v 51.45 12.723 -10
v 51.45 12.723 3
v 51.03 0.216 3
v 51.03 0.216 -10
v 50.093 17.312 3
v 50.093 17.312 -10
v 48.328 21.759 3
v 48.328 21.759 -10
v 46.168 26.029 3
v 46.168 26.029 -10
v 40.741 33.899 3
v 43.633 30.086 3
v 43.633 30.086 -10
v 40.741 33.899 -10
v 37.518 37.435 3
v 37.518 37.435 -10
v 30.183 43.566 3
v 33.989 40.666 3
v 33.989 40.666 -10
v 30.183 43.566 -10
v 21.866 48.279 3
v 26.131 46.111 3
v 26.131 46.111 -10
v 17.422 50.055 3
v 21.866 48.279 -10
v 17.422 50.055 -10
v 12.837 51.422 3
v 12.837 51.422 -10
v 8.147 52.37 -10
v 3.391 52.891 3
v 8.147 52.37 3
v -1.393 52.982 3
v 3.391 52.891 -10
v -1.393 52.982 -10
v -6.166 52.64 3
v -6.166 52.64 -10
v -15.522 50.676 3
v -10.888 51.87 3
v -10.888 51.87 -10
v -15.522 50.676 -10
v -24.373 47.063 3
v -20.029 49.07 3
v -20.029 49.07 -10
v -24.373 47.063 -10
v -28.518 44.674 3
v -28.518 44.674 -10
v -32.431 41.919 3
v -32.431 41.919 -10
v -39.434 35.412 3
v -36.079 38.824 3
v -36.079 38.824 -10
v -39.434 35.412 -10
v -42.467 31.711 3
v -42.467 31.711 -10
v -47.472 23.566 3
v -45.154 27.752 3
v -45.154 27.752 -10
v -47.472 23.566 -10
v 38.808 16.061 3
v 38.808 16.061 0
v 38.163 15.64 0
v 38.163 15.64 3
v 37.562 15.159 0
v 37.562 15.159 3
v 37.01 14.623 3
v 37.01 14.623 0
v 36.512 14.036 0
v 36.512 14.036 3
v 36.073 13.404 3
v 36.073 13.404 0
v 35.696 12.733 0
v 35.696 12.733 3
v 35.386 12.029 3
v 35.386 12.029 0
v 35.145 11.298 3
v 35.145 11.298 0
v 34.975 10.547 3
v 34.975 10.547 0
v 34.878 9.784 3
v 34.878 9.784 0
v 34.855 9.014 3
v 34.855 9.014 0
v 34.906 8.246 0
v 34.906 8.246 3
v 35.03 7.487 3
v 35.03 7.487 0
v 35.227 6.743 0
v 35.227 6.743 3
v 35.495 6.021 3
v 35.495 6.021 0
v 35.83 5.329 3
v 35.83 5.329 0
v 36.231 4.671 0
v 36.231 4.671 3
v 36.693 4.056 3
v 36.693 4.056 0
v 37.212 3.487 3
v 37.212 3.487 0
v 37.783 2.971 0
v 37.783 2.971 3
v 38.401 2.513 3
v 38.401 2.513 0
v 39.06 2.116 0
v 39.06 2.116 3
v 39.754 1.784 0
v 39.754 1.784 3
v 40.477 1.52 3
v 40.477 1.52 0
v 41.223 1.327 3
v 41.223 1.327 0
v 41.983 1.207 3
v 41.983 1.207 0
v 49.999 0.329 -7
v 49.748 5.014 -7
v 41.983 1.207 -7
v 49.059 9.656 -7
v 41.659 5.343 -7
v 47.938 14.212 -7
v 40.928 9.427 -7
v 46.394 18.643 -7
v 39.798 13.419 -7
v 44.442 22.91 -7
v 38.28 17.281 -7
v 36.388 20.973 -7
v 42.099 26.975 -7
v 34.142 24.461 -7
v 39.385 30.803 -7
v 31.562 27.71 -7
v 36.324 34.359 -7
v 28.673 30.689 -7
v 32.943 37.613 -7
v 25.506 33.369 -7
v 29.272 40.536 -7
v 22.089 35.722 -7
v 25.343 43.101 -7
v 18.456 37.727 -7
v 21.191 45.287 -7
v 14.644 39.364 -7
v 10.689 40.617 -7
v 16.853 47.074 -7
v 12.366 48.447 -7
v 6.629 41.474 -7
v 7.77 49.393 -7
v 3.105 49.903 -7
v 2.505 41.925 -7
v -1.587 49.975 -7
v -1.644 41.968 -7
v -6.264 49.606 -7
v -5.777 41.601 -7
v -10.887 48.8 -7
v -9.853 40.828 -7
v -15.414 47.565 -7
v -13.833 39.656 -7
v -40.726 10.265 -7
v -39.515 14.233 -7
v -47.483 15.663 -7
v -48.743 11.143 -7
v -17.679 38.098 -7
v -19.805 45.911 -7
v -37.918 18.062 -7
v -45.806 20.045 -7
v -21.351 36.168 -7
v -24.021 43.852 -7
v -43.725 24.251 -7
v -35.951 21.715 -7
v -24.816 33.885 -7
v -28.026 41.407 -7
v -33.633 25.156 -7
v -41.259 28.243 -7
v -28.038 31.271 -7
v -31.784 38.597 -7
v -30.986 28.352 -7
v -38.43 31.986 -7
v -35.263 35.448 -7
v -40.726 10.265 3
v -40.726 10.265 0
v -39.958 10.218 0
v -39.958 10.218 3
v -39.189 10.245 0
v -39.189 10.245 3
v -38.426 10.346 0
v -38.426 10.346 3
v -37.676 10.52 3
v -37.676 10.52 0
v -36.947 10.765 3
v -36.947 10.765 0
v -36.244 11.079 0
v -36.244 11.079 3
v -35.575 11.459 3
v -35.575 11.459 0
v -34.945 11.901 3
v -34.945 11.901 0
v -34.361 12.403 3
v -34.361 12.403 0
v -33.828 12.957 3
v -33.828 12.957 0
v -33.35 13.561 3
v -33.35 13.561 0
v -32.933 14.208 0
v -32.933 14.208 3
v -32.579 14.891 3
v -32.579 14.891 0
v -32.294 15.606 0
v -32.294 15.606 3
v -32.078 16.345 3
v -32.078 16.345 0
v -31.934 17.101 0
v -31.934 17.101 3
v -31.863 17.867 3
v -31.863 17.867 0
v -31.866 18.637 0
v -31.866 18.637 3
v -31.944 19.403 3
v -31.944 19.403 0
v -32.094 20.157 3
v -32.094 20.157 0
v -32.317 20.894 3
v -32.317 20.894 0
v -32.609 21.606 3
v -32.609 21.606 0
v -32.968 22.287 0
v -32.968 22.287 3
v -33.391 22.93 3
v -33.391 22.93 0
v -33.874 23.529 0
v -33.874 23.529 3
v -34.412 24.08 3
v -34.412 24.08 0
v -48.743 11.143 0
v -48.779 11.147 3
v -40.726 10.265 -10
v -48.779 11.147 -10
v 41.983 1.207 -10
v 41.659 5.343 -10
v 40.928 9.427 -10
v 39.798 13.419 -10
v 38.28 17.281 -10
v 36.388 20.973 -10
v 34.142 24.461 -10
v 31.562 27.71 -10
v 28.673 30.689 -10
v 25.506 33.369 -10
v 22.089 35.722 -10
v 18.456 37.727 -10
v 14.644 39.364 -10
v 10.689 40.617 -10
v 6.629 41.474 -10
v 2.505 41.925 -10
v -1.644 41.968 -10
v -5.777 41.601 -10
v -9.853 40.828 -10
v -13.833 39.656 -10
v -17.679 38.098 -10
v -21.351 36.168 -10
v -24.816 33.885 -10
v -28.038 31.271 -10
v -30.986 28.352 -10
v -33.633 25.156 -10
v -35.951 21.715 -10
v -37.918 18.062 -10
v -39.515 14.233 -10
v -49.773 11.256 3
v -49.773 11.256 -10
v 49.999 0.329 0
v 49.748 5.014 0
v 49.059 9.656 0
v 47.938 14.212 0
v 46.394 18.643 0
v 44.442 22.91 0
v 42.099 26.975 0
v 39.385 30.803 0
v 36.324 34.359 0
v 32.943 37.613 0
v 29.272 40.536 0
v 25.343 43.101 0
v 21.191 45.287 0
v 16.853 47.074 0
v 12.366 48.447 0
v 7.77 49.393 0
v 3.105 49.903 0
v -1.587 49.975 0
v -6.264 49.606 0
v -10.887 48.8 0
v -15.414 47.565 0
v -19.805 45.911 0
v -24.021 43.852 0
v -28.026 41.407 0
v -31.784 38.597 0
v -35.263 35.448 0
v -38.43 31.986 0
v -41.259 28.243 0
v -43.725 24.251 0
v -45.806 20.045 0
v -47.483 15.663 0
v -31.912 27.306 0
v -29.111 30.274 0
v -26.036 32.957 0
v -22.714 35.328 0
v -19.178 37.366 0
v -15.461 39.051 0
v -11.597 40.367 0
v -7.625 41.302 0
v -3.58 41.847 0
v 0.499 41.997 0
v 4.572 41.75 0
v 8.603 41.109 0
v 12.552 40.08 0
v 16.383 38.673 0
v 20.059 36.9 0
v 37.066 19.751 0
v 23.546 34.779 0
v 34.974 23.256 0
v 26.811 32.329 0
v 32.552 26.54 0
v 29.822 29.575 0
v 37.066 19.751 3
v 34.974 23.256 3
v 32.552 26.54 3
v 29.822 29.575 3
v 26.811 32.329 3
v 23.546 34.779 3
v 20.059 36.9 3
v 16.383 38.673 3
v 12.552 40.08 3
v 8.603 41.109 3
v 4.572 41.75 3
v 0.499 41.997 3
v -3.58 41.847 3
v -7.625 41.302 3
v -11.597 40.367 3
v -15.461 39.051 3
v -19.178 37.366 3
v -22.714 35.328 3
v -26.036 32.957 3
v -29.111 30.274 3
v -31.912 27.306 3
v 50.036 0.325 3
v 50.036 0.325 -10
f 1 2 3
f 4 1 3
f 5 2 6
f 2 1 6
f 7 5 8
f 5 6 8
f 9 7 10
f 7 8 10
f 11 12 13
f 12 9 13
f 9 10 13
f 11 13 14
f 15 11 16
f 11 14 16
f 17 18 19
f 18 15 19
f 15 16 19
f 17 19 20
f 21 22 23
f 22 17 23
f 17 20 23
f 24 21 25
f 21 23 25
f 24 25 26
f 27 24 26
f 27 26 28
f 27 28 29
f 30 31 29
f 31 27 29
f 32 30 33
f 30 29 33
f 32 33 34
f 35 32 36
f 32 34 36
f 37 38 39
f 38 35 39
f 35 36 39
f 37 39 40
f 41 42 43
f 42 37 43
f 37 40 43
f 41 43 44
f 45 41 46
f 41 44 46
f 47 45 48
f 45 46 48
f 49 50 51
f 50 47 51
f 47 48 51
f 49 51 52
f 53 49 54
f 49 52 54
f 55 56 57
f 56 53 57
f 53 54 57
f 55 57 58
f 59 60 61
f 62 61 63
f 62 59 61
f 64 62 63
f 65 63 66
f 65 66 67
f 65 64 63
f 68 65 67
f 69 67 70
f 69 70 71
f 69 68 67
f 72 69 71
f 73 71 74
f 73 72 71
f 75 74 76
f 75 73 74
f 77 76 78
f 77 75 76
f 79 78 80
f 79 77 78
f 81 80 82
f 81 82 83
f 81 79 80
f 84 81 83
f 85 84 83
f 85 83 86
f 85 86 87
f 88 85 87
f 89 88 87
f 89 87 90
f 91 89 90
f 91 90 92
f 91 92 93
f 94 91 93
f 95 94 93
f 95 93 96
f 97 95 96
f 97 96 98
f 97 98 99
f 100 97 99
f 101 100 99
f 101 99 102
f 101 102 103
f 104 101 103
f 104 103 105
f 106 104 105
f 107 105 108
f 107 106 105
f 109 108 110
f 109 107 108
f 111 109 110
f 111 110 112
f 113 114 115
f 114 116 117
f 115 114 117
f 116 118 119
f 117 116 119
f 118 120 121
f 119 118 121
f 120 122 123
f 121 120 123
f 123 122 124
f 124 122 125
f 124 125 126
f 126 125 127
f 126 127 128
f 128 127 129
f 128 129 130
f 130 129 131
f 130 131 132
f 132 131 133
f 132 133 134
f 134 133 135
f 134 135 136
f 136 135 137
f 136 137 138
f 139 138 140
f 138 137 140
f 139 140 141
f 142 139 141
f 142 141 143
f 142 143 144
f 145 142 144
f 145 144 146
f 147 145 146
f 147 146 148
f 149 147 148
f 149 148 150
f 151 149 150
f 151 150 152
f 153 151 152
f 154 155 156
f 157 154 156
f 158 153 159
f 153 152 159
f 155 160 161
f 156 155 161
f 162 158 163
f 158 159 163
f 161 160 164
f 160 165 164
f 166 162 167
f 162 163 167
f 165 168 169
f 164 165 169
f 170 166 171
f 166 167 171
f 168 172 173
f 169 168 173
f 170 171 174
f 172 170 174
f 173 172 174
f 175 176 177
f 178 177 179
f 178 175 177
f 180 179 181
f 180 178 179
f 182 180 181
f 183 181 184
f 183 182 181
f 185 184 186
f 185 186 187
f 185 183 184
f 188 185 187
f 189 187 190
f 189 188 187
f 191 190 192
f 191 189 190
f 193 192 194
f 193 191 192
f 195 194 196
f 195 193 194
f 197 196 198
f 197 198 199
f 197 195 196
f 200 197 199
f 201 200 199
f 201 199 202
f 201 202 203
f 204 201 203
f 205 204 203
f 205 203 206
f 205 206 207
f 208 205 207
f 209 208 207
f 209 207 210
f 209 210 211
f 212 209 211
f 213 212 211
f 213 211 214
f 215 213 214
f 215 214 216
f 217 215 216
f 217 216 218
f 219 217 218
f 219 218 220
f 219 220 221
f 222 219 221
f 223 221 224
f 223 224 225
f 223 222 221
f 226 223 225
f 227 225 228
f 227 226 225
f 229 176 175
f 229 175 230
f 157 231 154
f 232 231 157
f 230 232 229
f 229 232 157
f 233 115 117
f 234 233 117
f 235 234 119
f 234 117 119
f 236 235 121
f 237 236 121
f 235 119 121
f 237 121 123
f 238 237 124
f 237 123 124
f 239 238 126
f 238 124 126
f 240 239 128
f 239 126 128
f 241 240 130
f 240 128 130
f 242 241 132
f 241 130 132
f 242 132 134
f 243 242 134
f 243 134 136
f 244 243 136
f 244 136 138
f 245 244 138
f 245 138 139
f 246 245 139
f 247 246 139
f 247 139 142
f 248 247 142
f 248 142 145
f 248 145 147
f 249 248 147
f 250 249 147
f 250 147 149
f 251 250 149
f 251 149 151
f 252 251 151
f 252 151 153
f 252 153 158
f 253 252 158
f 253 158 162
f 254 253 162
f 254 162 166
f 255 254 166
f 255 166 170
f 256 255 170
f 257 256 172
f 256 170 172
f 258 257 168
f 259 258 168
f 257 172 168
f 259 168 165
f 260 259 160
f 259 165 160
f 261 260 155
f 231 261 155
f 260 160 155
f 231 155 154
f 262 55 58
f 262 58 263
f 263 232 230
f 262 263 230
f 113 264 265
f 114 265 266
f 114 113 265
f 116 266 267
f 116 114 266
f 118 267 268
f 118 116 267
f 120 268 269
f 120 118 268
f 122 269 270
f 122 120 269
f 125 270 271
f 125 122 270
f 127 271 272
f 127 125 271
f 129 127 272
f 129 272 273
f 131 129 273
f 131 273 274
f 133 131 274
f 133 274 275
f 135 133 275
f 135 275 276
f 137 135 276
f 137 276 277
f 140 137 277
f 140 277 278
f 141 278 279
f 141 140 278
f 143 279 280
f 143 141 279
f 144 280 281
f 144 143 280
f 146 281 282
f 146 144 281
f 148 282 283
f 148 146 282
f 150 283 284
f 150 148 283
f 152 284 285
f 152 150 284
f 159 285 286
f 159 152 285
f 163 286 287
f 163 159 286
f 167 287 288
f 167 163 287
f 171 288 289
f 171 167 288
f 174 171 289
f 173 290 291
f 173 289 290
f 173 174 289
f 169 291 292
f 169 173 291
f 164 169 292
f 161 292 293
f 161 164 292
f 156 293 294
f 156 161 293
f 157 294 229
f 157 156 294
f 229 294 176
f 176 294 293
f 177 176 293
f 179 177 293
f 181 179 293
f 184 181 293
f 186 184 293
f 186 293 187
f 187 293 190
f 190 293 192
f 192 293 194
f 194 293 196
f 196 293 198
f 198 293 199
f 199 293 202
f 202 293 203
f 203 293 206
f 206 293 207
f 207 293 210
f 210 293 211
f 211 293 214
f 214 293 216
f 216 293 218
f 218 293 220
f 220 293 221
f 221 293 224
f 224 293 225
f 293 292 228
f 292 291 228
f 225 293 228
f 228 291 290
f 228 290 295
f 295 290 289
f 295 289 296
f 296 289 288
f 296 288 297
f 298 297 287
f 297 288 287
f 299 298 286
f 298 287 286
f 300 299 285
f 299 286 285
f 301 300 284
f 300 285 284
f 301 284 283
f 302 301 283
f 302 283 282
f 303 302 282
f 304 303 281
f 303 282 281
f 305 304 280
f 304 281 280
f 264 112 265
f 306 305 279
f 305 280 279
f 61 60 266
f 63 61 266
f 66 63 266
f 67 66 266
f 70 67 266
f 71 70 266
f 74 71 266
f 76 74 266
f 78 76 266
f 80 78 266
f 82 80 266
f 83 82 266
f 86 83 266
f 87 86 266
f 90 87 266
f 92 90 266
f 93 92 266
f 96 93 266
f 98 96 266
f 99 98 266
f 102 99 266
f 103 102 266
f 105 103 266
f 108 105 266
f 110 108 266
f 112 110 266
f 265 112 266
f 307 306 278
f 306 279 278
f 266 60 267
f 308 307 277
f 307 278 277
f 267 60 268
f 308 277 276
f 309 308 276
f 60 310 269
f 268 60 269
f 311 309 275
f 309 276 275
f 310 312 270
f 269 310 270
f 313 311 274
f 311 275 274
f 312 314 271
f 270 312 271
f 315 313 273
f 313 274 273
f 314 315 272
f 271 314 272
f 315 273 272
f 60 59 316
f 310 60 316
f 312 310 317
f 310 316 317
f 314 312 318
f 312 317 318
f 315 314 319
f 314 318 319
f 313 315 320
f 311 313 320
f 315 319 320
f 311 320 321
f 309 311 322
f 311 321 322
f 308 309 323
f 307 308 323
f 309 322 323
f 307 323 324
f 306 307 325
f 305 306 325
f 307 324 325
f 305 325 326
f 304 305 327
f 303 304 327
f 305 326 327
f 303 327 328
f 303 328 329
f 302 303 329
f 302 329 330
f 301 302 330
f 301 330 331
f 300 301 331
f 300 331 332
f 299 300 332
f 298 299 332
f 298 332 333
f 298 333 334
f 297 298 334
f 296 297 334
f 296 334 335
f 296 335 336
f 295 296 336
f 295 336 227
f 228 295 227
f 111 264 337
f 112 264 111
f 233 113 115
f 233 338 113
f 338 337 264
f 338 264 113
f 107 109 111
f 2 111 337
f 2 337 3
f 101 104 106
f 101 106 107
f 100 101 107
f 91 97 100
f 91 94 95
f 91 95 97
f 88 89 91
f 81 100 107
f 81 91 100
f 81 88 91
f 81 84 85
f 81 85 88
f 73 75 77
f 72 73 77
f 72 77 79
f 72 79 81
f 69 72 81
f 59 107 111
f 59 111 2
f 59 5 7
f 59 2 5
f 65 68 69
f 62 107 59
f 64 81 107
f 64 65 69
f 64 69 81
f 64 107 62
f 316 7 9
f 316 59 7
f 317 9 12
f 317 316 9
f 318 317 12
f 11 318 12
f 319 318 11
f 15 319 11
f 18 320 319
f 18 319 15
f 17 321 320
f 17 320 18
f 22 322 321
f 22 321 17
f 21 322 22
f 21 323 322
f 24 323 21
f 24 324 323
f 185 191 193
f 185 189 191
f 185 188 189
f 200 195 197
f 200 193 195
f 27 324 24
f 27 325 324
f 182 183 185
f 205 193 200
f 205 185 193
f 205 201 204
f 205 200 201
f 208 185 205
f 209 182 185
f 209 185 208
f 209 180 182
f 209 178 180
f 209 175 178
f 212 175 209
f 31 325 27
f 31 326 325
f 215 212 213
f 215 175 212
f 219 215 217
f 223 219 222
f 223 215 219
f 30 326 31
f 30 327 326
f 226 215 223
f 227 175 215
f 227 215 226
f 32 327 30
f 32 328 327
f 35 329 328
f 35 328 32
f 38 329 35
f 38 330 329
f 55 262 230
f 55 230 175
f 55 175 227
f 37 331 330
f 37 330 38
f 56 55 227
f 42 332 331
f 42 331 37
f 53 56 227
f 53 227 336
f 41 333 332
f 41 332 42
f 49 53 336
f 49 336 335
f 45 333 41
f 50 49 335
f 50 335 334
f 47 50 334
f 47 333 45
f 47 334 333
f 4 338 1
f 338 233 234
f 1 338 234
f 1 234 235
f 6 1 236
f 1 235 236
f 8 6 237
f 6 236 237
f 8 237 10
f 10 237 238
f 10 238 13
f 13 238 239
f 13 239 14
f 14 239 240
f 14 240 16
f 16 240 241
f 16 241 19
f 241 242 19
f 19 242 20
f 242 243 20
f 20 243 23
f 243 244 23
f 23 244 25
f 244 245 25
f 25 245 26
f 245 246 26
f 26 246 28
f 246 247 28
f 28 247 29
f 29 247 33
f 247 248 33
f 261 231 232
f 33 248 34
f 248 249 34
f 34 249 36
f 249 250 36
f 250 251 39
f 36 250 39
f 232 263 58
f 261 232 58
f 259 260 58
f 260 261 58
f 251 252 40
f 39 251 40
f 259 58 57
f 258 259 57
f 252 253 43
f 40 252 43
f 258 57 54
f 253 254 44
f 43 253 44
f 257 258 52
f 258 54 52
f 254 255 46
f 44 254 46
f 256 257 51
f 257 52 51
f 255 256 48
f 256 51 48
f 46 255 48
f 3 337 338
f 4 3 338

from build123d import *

# Parameters (mm, degrees)
SKETCH1_W                    = 50
SKETCH1_H                    = 7
REVOLVE5_ANGLE               = 167.5
SHELL2_T                     = 3
CUT_EXTRUDE3_DEPTH           = 77.072333999
CUT_EXTRUDE3_DEPTH_BACK      = 10
CUT_EXTRUDE4_DEPTH           = 77.072333999
CUT_EXTRUDE4_DEPTH_BACK      = 10
CUT_EXTRUDE_THIN1_DEPTH      = 77.072333999
CUT_EXTRUDE_THIN1_DEPTH_BACK = 20
CUT_EXTRUDE_THIN2_DEPTH      = 77.072333999
CUT_EXTRUDE_THIN2_DEPTH_BACK = 20
CUT_EXTRUDE_THIN3_DEPTH      = 76.000787866
CUT_EXTRUDE_THIN3_DEPTH_BACK = 20
SKETCH18_R                   = 8
BOSS_EXTRUDE3_DEPTH          = 3
SKETCH22_W                   = 13
SKETCH22_H                   = 12.488136332
BOSS_EXTRUDE4_DEPTH          = 1
SKETCH23_W                   = 13
SKETCH23_H                   = 12.478928716
BOSS_EXTRUDE5_DEPTH          = 1
CUT_EXTRUDE_THIN4_DEPTH      = 76.647331154
CUT_EXTRUDE_THIN4_DEPTH_BACK = 20
CUT_EXTRUDE_THIN5_DEPTH      = 76.000787866
CUT_EXTRUDE_THIN5_DEPTH_BACK = 20


with BuildPart() as part:
    # Sketch1 → Revolve5 (revolve)
    with BuildSketch(Plane(origin=(0, 0, 0), x_dir=(1, 0, 0), z_dir=(0, 1, 0))):
        with Locations((25, 3.5)):
            Rectangle(SKETCH1_W, SKETCH1_H)
    revolve(axis=Axis((0, 0, 0), (0, 0, 1)), revolution_arc=REVOLVE5_ANGLE)

    # Shell2
    shell2_openings = [part.faces().sort_by_distance(p)[0] for p in [
        (25, 0, -3.5),
        (-24.407400178, 5.410990348, -3.5),
    ]]
    offset(amount=SHELL2_T, openings=shell2_openings, kind=Kind.INTERSECTION)

    # Sketch11 → Cut-Extrude3 (cut, two sides: drawn at the far end of the back side and taken through both)
    with BuildSketch(Plane.XY.offset(3).offset(-CUT_EXTRUDE3_DEPTH_BACK)):
        Polygon((-295.067343662, 38.119573796), (-51.743688377, 11.471299539), (53, 0), (296.323655284, -26.648274258), (243.027106769, -513.295584826), (-348.363892177, -448.527736772), align=None)
    extrude(amount=CUT_EXTRUDE3_DEPTH + CUT_EXTRUDE3_DEPTH_BACK, mode=Mode.SUBTRACT)

    # Sketch12 → Cut-Extrude4 (cut, two sides: drawn at the far end of the back side and taken through both)
    with BuildSketch(Plane(origin=(0, 0, -10), x_dir=(-1, 0, 0), z_dir=(0, 0, -1)).offset(-CUT_EXTRUDE4_DEPTH_BACK)):
        Polygon((-296.323655284, -26.648274258), (-53, 0), (51.743688377, 11.471299539), (295.067343662, 38.119573796), (348.363892177, -448.527736772), (-243.027106769, -513.295584826), align=None)
    extrude(amount=CUT_EXTRUDE4_DEPTH + CUT_EXTRUDE4_DEPTH_BACK, mode=Mode.SUBTRACT)

    # Sketch13 → Cut-Extrude-Thin1 (cut, two sides: drawn at the far end of the back side and taken through both)
    with BuildSketch(Plane(origin=(0, 0, -10), x_dir=(-1, 0, 0), z_dir=(0, 0, -1)).offset(-CUT_EXTRUDE_THIN1_DEPTH_BACK)):
        Polygon((48.779244367, 11.146640118), (47.419699991, 23.560551191), (57.360263374, 24.64921994), (58.719807749, 12.235308866), align=None)
    extrude(amount=CUT_EXTRUDE_THIN1_DEPTH + CUT_EXTRUDE_THIN1_DEPTH_BACK, mode=Mode.SUBTRACT)

    # Sketch14 → Cut-Extrude-Thin2 (cut, two sides: drawn at the far end of the back side and taken through both)
    with BuildSketch(Plane(origin=(0, 0, -10), x_dir=(-1, 0, 0), z_dir=(0, 0, -1)).offset(-CUT_EXTRUDE_THIN2_DEPTH_BACK)):
        Polygon((-50.035555989, 0.324659421), (-51.39409796, 12.729417605), (-81.215788107, 9.46341136), (-79.857246136, -2.941346825), align=None)
    extrude(amount=CUT_EXTRUDE_THIN2_DEPTH + CUT_EXTRUDE_THIN2_DEPTH_BACK, mode=Mode.SUBTRACT)

    # Sketch15 → Cut-Extrude-Thin3 (cut, two sides: drawn at the far end of the back side and taken through both)
    with BuildSketch(Plane(origin=(0, 0, -10), x_dir=(-1, 0, 0), z_dir=(0, 0, -1)).offset(-CUT_EXTRUDE_THIN3_DEPTH_BACK)):
        with BuildLine():
            ThreePointArc((-41.982664634, 1.20659446), (-4.572408744, 41.750366205), (40.726353012, 10.264705079))
            Line((40.726353012, 10.264705079), (11.636100861, 2.93277288))
            ThreePointArc((11.636100861, 2.93277288), (-1.306402498, 11.928676059), (-11.995047038, 0.344741274))
            Line((-11.995047038, 0.344741274), (-41.982664634, 1.20659446))
        make_face()
    extrude(amount=CUT_EXTRUDE_THIN3_DEPTH + CUT_EXTRUDE_THIN3_DEPTH_BACK, mode=Mode.SUBTRACT)


with BuildPart() as body_2:
    # of the pieces the cut leaves, the one that is kept (cut_extrude_thin3_keep)
    add(part.part.solids().sort_by_distance((49.998919737, 0.328671743, 0))[0])

    # Sketch18 → Boss-Extrude3 (add)
    with BuildSketch(Plane.XY.offset(3)):
        with Locations((-39.855418013, 18.217155785)):
            Circle(SKETCH18_R)
        with Locations((42.853599633, 9.159045166)):
            Circle(SKETCH18_R)
    extrude(amount=-BOSS_EXTRUDE3_DEPTH)

    # Sketch22 → Boss-Extrude4 (add)
    with BuildSketch(Plane(origin=(-49.407400178, 5.410990348, 0), x_dir=(0, 0, 1), z_dir=(-0.99405633822232, 0.10886687485196148, 0))):
        with Locations((-3.5, 12.014012533)):
            Rectangle(SKETCH22_W, SKETCH22_H)
    extrude(amount=BOSS_EXTRUDE4_DEPTH)

    # Sketch23 → Boss-Extrude5 (add)
    with BuildSketch(Plane(origin=(49.407400178, -5.410990348, 0), x_dir=(0, 0, -1), z_dir=(0.9940563382223201, -0.10886687485196078, 0))):
        with Locations((3.5, 12.009408725)):
            Rectangle(SKETCH23_W, SKETCH23_H)
    extrude(amount=BOSS_EXTRUDE5_DEPTH)

    # Sketch25 → Cut-Extrude-Thin4 (cut, two sides: drawn at the far end of the back side and taken through both)
    with BuildSketch(Plane(origin=(0, 0, -10), x_dir=(-1, 0, 0), z_dir=(0, 0, -1)).offset(-CUT_EXTRUDE_THIN4_DEPTH_BACK)):
        Polygon((-51.450152385, 12.723278647), (-51.029612328, 0.215792546), (-61.023964562, -0.12024824), (-61.44450462, 12.387237861), align=None)
    extrude(amount=CUT_EXTRUDE_THIN4_DEPTH + CUT_EXTRUDE_THIN4_DEPTH_BACK, mode=Mode.SUBTRACT)

    # Sketch26 → Cut-Extrude-Thin5 (cut, two sides: drawn at the far end of the back side and taken through both)
    with BuildSketch(Plane.XY.offset(3).offset(-CUT_EXTRUDE_THIN5_DEPTH_BACK)):
        Polygon((-47.472396692, 23.566322419), (-49.773300705, 11.255506993), (-59.603087399, 13.092704194), (-57.302183385, 25.40351962), align=None)
    extrude(amount=CUT_EXTRUDE_THIN5_DEPTH + CUT_EXTRUDE_THIN5_DEPTH_BACK, mode=Mode.SUBTRACT)


solid = body_2.part
